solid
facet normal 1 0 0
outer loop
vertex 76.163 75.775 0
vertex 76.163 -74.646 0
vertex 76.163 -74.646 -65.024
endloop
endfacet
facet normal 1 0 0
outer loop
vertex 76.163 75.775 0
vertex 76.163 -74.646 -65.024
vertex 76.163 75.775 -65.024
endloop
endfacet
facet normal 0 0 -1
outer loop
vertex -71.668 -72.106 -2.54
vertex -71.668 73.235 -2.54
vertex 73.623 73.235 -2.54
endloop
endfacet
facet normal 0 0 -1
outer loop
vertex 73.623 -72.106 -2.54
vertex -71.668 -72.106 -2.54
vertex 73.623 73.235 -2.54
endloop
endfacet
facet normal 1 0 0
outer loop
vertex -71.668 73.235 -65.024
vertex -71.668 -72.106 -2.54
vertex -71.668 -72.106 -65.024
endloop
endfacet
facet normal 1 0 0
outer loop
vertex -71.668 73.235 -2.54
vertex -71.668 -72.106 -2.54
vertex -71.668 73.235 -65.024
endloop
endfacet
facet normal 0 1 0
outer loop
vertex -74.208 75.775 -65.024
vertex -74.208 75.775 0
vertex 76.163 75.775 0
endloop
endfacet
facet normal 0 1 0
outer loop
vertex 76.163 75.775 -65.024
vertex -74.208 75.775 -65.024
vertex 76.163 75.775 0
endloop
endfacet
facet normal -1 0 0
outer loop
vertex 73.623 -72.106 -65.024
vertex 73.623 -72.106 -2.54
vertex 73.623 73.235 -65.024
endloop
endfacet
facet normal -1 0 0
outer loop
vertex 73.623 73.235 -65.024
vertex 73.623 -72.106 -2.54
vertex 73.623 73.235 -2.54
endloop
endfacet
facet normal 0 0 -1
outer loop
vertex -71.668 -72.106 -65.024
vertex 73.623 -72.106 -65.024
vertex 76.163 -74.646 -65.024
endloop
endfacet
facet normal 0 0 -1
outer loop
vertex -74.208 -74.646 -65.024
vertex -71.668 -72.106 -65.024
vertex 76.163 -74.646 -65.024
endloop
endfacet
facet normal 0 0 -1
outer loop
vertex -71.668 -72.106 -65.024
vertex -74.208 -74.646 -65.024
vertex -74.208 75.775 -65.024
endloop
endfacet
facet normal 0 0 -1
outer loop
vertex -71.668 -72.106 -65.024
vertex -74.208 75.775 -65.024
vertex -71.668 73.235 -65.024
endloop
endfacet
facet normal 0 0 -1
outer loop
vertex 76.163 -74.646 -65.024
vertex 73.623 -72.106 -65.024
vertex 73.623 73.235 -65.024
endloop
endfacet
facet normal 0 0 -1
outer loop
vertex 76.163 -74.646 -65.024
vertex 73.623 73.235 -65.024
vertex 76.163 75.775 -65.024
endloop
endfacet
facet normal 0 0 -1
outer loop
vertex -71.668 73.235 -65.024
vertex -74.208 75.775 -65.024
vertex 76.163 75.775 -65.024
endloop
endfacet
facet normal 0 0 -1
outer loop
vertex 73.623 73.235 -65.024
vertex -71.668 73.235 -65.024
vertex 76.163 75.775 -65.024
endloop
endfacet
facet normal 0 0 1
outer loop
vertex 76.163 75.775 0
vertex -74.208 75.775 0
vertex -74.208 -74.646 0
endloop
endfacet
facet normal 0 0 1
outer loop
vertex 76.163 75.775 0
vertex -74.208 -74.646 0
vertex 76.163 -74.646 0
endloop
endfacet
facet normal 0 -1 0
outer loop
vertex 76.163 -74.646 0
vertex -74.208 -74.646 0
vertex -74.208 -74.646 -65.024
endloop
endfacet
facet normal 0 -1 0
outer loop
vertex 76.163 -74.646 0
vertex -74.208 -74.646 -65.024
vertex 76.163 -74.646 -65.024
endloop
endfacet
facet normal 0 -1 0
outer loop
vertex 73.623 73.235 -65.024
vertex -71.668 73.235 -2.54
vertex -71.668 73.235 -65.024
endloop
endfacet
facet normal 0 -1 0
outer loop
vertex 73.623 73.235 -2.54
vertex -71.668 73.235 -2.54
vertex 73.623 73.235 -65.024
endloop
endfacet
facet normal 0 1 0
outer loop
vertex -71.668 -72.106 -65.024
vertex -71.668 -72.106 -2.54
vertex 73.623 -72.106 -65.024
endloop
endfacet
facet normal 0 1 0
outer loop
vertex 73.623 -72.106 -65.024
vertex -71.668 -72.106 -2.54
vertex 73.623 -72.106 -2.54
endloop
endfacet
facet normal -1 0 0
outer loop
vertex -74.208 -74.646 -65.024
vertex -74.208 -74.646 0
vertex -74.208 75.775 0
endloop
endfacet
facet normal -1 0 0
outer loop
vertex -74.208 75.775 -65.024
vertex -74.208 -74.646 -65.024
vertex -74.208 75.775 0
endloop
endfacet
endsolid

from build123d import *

# Parameters (mm, degrees)
F0_W     = 150.370433
F0_H     = 150.421701
F1_DEPTH = 65.024
F2_T     = -2.54


with BuildPart() as f1:
    # F0 (on Top) → F1 (new body)
    with BuildSketch(Plane.XY):
        with Locations((0.977538, 0.564386)):
            Rectangle(F0_W, F0_H)
    extrude(amount=-F1_DEPTH)

    # F2
    f2_openings = [f1.faces().sort_by_distance(p)[0] for p in [
        (0.977539, 0.564385, -65.024),
    ]]
    offset(amount=F2_T, openings=f2_openings)


solid = f1.part
